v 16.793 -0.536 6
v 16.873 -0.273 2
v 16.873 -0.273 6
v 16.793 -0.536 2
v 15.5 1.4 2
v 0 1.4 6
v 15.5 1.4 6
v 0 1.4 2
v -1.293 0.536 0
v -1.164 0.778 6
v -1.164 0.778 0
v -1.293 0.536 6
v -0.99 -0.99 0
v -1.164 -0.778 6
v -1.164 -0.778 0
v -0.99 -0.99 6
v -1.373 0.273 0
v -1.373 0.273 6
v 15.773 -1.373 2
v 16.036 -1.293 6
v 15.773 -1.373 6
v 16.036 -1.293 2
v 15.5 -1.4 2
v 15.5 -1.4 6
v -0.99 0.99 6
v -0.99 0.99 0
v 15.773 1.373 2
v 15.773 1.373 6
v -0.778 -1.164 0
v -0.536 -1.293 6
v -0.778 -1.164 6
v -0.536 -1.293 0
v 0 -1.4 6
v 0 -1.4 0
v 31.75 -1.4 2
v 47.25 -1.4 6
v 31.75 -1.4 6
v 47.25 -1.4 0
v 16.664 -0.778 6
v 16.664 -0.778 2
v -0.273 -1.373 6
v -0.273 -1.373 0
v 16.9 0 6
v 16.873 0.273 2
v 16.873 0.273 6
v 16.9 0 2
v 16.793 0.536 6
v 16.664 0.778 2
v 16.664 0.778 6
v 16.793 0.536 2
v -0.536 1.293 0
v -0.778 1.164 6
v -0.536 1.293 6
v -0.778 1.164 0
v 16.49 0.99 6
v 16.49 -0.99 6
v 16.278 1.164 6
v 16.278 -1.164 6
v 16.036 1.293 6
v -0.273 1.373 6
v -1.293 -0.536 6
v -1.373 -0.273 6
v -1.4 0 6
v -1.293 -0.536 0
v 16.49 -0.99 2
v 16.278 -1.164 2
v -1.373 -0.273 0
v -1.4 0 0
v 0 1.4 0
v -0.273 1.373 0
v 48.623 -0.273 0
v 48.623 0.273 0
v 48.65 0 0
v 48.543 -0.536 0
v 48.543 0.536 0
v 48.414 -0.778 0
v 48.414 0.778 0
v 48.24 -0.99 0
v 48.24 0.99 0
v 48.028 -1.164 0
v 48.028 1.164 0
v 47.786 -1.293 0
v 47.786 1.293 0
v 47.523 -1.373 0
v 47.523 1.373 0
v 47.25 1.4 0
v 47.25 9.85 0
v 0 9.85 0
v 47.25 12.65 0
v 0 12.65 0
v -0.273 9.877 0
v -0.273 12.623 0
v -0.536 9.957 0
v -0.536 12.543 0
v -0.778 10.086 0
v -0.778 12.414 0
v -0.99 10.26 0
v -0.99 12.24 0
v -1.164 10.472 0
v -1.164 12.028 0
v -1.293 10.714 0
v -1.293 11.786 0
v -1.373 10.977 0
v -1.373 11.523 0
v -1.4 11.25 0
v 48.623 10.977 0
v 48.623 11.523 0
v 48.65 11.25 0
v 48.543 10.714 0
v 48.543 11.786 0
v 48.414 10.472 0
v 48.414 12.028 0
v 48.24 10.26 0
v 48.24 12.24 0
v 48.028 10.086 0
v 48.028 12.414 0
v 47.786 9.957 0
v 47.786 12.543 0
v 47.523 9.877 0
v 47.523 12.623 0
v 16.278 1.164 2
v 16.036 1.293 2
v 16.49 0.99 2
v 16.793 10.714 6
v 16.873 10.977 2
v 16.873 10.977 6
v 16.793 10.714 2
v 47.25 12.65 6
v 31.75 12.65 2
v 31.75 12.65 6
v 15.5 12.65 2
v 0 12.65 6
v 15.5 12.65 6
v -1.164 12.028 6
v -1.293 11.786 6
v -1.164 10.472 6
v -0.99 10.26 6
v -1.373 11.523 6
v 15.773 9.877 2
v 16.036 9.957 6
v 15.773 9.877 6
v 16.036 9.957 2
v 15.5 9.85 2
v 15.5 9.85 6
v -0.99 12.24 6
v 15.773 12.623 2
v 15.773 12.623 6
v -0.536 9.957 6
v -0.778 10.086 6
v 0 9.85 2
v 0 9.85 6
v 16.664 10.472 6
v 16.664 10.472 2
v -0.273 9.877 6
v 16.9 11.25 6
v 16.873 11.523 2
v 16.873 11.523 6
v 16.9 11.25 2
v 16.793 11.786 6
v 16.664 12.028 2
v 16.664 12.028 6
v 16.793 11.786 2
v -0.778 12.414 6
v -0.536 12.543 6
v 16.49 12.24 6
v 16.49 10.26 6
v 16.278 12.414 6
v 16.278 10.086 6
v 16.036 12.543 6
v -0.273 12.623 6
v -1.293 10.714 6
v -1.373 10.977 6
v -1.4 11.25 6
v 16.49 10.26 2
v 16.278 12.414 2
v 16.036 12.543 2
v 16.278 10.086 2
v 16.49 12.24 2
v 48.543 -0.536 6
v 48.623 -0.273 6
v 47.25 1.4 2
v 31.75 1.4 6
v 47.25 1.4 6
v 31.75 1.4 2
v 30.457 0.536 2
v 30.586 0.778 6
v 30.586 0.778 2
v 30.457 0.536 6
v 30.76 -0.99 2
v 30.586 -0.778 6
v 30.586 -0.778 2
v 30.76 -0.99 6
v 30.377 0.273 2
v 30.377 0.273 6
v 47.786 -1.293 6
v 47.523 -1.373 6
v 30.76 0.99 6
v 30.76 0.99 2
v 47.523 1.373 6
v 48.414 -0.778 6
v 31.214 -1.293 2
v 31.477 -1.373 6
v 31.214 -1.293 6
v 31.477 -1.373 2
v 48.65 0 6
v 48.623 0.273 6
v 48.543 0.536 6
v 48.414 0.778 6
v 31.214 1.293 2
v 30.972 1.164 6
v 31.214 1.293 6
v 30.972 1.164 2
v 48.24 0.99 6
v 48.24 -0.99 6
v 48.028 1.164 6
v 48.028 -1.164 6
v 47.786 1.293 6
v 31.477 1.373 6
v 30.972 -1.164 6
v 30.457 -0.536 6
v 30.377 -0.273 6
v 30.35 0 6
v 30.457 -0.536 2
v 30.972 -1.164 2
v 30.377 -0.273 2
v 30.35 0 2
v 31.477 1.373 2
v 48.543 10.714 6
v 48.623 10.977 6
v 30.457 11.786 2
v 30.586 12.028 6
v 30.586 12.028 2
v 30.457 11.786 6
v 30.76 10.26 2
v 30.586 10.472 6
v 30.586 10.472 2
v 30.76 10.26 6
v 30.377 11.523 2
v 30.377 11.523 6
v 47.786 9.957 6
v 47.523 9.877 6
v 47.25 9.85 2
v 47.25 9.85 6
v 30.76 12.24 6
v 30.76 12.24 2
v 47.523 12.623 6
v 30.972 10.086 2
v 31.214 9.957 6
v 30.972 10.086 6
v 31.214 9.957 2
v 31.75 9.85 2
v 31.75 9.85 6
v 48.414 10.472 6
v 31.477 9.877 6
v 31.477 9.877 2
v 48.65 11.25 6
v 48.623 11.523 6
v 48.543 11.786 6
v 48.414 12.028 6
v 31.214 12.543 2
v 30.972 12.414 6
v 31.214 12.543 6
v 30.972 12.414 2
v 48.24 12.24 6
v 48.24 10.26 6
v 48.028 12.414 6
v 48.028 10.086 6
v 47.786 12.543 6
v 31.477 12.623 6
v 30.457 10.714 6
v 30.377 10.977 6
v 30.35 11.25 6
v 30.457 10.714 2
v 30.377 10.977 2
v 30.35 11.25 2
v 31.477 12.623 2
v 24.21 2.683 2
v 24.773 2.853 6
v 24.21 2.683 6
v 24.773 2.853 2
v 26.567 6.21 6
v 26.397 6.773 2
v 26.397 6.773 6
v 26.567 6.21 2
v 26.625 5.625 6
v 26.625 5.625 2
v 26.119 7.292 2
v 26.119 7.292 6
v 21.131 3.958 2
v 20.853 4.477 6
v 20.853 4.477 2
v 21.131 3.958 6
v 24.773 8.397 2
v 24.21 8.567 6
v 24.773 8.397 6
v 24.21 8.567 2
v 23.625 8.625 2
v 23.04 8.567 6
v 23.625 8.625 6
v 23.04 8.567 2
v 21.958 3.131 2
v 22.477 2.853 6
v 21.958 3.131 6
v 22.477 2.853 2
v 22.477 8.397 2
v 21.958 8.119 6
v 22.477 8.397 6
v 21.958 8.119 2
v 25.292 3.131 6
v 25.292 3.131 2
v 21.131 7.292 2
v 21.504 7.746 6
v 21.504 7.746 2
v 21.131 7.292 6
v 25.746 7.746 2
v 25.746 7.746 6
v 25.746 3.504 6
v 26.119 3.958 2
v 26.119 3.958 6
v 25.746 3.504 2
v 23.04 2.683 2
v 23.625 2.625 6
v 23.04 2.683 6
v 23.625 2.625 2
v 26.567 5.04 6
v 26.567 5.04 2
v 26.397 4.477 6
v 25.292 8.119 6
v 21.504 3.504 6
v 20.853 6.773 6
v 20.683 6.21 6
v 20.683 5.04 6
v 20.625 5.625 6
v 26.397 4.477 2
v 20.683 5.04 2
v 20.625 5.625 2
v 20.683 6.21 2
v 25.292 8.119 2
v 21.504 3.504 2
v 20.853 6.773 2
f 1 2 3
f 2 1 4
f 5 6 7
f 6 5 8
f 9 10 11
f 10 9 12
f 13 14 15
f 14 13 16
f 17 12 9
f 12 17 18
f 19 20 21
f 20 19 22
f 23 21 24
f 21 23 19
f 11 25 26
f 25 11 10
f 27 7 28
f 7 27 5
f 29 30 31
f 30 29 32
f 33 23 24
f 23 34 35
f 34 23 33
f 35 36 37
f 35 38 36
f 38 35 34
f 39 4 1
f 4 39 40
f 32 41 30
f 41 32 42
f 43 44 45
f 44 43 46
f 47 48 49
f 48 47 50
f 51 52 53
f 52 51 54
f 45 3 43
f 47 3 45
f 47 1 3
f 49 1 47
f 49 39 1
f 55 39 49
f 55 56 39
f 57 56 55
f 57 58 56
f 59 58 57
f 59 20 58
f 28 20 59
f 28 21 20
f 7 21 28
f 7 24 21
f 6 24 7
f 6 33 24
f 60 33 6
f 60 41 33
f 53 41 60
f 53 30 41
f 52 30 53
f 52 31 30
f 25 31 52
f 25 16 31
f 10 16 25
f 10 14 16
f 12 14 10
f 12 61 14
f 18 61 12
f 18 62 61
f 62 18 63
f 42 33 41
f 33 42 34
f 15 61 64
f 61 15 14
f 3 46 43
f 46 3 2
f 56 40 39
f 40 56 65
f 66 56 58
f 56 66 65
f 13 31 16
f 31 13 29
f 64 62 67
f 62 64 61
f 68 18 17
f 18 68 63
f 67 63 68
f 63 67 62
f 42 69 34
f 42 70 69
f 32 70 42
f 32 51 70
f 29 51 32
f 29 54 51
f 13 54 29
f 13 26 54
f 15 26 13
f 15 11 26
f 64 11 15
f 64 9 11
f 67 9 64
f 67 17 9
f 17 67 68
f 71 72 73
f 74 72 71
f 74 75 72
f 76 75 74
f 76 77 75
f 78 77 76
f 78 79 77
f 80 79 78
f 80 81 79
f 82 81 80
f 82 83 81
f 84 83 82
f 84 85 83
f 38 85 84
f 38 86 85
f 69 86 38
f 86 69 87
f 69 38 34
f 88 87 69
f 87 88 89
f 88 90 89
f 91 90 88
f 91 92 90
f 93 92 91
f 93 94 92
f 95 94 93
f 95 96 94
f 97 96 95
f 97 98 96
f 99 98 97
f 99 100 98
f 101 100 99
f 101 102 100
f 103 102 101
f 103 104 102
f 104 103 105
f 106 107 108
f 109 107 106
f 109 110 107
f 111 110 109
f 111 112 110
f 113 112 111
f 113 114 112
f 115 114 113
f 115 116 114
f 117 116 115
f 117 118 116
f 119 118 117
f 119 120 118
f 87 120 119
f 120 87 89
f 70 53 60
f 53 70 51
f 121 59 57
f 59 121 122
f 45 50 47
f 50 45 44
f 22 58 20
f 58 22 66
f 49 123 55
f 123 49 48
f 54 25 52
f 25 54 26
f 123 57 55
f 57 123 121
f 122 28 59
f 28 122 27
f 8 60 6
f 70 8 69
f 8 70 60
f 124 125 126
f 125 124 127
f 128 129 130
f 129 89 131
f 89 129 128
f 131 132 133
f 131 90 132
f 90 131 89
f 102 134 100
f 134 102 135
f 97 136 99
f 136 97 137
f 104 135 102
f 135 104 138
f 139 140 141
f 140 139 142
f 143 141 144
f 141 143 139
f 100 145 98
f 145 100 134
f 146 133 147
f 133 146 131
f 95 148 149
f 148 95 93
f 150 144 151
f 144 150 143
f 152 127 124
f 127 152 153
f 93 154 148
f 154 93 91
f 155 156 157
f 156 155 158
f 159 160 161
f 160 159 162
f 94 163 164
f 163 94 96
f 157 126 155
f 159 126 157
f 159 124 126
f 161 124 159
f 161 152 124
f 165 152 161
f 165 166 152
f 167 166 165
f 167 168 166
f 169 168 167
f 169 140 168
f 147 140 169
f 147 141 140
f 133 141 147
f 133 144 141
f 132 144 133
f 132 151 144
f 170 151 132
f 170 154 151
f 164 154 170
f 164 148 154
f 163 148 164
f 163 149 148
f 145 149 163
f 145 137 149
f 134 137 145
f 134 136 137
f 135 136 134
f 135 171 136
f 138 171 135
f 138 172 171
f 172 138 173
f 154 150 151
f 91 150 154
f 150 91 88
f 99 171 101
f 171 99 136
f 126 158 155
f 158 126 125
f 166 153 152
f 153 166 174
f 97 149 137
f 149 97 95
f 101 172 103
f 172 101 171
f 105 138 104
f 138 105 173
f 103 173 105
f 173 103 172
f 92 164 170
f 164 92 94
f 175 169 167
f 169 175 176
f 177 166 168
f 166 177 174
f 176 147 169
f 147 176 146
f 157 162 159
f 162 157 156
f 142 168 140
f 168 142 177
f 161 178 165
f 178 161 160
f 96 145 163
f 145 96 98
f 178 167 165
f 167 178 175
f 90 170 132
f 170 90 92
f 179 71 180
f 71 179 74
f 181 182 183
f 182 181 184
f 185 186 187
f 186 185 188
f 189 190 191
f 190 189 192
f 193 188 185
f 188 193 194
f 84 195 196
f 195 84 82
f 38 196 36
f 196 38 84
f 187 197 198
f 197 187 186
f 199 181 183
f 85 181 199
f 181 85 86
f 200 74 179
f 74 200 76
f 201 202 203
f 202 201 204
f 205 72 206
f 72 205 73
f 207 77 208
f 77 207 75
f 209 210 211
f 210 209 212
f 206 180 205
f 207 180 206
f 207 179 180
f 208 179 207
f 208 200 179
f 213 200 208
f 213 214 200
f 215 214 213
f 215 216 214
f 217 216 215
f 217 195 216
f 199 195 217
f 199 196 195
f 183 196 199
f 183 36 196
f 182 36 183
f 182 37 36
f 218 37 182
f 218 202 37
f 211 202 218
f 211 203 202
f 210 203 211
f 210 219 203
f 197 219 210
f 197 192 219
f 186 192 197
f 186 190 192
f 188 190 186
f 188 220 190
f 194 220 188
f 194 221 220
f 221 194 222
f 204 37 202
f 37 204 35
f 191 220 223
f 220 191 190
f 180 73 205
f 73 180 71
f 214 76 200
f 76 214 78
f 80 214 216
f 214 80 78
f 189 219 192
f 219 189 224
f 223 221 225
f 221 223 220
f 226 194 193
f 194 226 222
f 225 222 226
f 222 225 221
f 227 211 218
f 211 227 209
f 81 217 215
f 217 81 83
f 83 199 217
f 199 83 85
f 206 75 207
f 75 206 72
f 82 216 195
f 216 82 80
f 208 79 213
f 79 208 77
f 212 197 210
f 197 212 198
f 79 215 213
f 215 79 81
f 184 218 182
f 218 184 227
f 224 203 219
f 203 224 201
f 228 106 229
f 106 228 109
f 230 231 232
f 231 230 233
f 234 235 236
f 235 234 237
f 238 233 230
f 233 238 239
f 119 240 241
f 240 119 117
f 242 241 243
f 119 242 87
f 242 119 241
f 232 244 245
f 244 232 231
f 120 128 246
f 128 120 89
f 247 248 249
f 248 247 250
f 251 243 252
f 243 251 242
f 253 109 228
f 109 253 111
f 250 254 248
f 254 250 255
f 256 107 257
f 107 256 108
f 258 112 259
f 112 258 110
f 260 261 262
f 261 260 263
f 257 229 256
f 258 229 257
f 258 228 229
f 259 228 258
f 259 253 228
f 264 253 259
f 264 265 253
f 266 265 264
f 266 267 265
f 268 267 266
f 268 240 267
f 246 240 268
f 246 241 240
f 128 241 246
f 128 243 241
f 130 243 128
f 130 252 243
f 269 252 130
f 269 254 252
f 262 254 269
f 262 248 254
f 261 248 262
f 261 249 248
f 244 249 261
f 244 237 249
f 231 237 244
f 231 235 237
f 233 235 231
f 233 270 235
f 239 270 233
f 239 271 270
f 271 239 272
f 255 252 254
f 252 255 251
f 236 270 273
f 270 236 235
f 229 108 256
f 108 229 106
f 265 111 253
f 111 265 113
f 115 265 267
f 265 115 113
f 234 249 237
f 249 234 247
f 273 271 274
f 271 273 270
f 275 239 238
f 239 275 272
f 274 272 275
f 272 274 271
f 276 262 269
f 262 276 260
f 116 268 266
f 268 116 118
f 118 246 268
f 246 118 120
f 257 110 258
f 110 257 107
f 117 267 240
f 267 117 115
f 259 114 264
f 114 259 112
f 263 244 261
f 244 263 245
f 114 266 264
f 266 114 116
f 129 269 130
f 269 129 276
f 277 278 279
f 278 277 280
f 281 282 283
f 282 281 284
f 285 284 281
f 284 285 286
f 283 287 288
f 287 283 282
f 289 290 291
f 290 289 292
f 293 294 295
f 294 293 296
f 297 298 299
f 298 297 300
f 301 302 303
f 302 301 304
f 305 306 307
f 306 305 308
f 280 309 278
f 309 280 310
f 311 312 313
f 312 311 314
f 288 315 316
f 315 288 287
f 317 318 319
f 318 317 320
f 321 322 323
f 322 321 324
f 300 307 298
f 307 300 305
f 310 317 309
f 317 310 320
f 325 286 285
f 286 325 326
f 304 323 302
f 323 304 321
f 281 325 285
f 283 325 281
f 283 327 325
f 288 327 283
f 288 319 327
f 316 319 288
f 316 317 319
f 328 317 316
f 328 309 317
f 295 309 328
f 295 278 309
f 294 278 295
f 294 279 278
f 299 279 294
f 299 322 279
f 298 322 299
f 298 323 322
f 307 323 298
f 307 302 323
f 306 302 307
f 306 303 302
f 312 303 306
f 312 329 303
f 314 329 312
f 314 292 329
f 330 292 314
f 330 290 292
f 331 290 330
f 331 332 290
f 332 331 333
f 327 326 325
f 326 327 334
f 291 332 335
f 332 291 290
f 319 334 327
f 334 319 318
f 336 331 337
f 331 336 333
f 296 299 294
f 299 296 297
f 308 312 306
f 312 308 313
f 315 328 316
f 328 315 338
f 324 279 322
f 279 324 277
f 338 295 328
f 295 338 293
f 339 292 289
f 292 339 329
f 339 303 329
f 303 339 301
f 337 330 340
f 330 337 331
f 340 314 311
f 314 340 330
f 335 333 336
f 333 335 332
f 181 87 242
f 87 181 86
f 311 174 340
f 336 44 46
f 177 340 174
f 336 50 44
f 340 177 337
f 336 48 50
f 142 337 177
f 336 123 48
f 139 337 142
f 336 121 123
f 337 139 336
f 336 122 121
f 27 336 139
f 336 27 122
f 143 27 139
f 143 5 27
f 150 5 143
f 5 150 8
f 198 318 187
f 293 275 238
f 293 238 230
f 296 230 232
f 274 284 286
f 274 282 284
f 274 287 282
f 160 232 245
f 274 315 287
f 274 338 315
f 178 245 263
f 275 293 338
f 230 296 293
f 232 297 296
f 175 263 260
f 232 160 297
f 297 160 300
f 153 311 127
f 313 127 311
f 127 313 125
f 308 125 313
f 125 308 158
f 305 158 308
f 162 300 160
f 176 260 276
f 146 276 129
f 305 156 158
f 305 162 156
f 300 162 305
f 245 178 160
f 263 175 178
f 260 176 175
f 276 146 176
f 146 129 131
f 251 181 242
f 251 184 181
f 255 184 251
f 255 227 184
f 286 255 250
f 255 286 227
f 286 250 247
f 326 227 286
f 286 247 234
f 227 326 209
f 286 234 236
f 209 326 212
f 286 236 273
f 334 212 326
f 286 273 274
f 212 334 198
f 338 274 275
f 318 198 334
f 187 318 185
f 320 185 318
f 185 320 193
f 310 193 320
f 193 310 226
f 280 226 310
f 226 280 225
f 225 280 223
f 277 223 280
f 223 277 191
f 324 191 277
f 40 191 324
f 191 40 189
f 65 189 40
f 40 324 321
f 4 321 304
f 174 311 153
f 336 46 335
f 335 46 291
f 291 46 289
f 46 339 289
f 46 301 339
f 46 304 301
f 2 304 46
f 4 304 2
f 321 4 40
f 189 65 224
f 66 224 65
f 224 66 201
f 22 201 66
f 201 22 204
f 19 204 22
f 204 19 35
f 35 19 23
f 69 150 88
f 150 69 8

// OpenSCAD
// file: ../modules/screwHoles.scad
difference() {
  $fn=32;
  cylinder(r=5,h=5);
  translate([0,0,-2]) woodScrewNum8();
}

module woodScrewNum10() {
  $fn=32;
  translate([0,0,7.99]) cylinder(r=5, h=4.1);
  translate([0,0,4]) cylinder(r1=2, r2=5, h=4);
  translate([0,0,-0.1])  cylinder(r=2.6, h=6);
}


module woodScrewNum8() {
  $fn=32;
  translate([0,0,6.49]) cylinder(r=4.3, h=3.6);
  translate([0,0,4]) cylinder(r1=2.3, r2=4.3, h=2.5);
  translate([0,0,-0.1]) cylinder(r=2.3, h=6);
}
// file: monitor-lift-poles.scad
poleR=7;
poleL=533;


module pole(plus=0) {
  rotate([0,90,0]) cylinder(r=poleR+plus,h=poleL);
}

module poles(poleD,doz=true,plus=0) {
  z= doz ? -poleR-4 : 0;
  translate([0,0,z]) {
    pole(plus);
    translate([0,poleD,0]) pole(plus);
  }
}

module poleScrewHole(hex=false) {
  translate([0,0,-poleR-4]) rotate([-90,0,0]) {
    cylinder(r=2.2,h=200);
    if(hex) {
      cylinder(r=4.2,h=4, $fn=6);
    }
  }
}
// main file
use <./monitor-lift-poles.scad>;
use <../modules/screwHoles.scad>;

$fn=32;
poleD=21;
mWidth=40;
mThicks=20;
baseT=3;
bracketL=400;
bracketT=5;
bracketScrewTrackLen=140;
wingW=bracketT/2;
grooveT=2;
mountR=31;

mountBracketScrewThingL=120;
bracketScrewC=3;
bracketScrewD=mountBracketScrewThingL/bracketScrewC;

innerW=mWidth-wingW*2-0.5;

// intersection() {
//   mountDisk(true);
//   cylinder(r=mountR,h=mThicks/2);
// }
// intersection() {
//   mountDisk(false);
//   cylinder(r=mountR,h=mThicks/2);
// }

// translate([mountR*2+1,0,0]) mountDisk(false);

// color("red") cylinder(r=50,h=2);
// mountBracket();

// translate([-10,0,bracketT*2]) rotate([0,180,0]) mountBracketScrewThing();

// screwTest();

// translate([50,0,0]) pipeHolder();

intersection() {
  bThing();
  //translate([-20,-11/2,-1]) cube([20000,11,20000]);
}

module bThing() {
  d=11.25;
  n=31.75;
  c=2;
  h=6;
  translate([15.5+(n-15.5)/2,d/2,0]) cylinder(r=3,h=h);

  for ( i = [0 : c-1] ){ 
    translate([n*i,0,0]) {
      bBit(h);
      translate([0,d,0]) bBit(h);
    }
  }

  translate([0,-1.4,0]) cube([15.5+n*(c-1),d+1.4*2,2]);
}

module bBit(h) {
  hull() {
    r=1.4;
    w=15.5;
    cylinder(r=r,h=h);
    translate([w,0,0]) cylinder(r=r,h=h);
  }
}

module pipeHolder() {
  t=12;
  difference() {
    cube([innerW,t,bracketT*2]);
    translate([innerW/2-poleD/2,t,-1]) rotate([0,0,-90]) rotate([0,-90,0]) poles(poleD,false,1);
    translate([innerW/2,-0.1,5]) rotate([-90,0,0]) {
      cylinder(r=4.2,h=3.6,$fn=6);
      cylinder(r=2.2,h=t+2);
    }
  }
}


module screwTest() {
  difference() {
    cylinder(r=5,h=10);
    woodScrewNum8();
    translate([0,-50,-1]) cube([100,100,100]);
  }
}

module grooves(w,l,t) {
  c=floor(l/t);
  intersection() {
    cube([w,l,t]);
    translate([0,t/2,0]) for ( i = [0 : c] ){
      translate([0,t*i,0]) rotate([45,0,0]) translate([0,-t/2,-t/2]) cube([w,t,t]);
    }
  }
}

module mountBracketScrewThing() {
  translate([0,0,bracketT])  difference() {
    union() {
      cube([innerW,mountBracketScrewThingL,bracketT]);
      mirror([0,0,1]) grooves(innerW,mountBracketScrewThingL,grooveT);
    }
    for ( i = [0 : bracketScrewC-1] ){
      translate([innerW/2,bracketScrewD*i+bracketScrewD/2,-2]) woodScrewNum8();
    }
  }
}

module mountBracket() {
  grooveLen=bracketScrewTrackLen+20;
  difference() {
    union() {
      cube([mWidth,bracketL,bracketT]);
      cube([wingW,bracketL,bracketT*3]);
      translate([mWidth/2-wingW/2,grooveLen,0]) cube([wingW,bracketL-grooveLen-30,bracketT*3]);
      translate([mWidth-wingW,0,0]) cube([wingW,bracketL,bracketT*3]);
      translate([0,0,bracketT]) grooves(mWidth,grooveLen,grooveT);
      translate([0,bracketL-10,0]) cube([mWidth,10,bracketT*3]);

    }
    hull() {
      translate([mWidth/2,0,-2]) cylinder(r=2.1,h=10);
      translate([mWidth/2,10+bracketScrewTrackLen,-2]) cylinder(r=2.1,h=10);
    }
    translate([mWidth/2-poleD/2,bracketL-10,-1]) rotate([0,0,-90]) rotate([0,-90,0]) poles(poleD,false);
    translate([mWidth/2-poleD/2,bracketL-10,bracketT]) rotate([0,0,-90]) rotate([0,-90,0]) poles(poleD,false,1);
    translate([mWidth/2,bracketL-11,bracketT*2]) rotate([-90,0,0]) cylinder(r=2.2,h=12);
  }
}

module mountDisk(nut=true) {
  vd=10;
  sz= nut ? 0: -10;

  difference() {
    yw=poleD+mThicks;
    cylinder(r=mountR,h=mThicks);
    translate([-100,-poleD/2,mThicks/2]) color("grey") poles(poleD,false,1);
    translate([0,0,sz]) {
      machineScrew();
      translate([0,25,0]) machineScrew();
      rotate([0,0,45/2]) translate([0,25,0]) machineScrew();
      rotate([0,0,-45/2]) translate([0,25,0]) machineScrew();
      translate([0,-25,0]) machineScrew();
      rotate([0,0,45/2]) translate([0,-25,0]) machineScrew();
      rotate([0,0,-45/2]) translate([0,-25,0]) machineScrew();
    }
  }
}

module machineScrew() {
  translate([0,0,-0.1]) cylinder(r=4.2,h=4.1,$fn=6);
  cylinder(r=2.25,h=50);
}
